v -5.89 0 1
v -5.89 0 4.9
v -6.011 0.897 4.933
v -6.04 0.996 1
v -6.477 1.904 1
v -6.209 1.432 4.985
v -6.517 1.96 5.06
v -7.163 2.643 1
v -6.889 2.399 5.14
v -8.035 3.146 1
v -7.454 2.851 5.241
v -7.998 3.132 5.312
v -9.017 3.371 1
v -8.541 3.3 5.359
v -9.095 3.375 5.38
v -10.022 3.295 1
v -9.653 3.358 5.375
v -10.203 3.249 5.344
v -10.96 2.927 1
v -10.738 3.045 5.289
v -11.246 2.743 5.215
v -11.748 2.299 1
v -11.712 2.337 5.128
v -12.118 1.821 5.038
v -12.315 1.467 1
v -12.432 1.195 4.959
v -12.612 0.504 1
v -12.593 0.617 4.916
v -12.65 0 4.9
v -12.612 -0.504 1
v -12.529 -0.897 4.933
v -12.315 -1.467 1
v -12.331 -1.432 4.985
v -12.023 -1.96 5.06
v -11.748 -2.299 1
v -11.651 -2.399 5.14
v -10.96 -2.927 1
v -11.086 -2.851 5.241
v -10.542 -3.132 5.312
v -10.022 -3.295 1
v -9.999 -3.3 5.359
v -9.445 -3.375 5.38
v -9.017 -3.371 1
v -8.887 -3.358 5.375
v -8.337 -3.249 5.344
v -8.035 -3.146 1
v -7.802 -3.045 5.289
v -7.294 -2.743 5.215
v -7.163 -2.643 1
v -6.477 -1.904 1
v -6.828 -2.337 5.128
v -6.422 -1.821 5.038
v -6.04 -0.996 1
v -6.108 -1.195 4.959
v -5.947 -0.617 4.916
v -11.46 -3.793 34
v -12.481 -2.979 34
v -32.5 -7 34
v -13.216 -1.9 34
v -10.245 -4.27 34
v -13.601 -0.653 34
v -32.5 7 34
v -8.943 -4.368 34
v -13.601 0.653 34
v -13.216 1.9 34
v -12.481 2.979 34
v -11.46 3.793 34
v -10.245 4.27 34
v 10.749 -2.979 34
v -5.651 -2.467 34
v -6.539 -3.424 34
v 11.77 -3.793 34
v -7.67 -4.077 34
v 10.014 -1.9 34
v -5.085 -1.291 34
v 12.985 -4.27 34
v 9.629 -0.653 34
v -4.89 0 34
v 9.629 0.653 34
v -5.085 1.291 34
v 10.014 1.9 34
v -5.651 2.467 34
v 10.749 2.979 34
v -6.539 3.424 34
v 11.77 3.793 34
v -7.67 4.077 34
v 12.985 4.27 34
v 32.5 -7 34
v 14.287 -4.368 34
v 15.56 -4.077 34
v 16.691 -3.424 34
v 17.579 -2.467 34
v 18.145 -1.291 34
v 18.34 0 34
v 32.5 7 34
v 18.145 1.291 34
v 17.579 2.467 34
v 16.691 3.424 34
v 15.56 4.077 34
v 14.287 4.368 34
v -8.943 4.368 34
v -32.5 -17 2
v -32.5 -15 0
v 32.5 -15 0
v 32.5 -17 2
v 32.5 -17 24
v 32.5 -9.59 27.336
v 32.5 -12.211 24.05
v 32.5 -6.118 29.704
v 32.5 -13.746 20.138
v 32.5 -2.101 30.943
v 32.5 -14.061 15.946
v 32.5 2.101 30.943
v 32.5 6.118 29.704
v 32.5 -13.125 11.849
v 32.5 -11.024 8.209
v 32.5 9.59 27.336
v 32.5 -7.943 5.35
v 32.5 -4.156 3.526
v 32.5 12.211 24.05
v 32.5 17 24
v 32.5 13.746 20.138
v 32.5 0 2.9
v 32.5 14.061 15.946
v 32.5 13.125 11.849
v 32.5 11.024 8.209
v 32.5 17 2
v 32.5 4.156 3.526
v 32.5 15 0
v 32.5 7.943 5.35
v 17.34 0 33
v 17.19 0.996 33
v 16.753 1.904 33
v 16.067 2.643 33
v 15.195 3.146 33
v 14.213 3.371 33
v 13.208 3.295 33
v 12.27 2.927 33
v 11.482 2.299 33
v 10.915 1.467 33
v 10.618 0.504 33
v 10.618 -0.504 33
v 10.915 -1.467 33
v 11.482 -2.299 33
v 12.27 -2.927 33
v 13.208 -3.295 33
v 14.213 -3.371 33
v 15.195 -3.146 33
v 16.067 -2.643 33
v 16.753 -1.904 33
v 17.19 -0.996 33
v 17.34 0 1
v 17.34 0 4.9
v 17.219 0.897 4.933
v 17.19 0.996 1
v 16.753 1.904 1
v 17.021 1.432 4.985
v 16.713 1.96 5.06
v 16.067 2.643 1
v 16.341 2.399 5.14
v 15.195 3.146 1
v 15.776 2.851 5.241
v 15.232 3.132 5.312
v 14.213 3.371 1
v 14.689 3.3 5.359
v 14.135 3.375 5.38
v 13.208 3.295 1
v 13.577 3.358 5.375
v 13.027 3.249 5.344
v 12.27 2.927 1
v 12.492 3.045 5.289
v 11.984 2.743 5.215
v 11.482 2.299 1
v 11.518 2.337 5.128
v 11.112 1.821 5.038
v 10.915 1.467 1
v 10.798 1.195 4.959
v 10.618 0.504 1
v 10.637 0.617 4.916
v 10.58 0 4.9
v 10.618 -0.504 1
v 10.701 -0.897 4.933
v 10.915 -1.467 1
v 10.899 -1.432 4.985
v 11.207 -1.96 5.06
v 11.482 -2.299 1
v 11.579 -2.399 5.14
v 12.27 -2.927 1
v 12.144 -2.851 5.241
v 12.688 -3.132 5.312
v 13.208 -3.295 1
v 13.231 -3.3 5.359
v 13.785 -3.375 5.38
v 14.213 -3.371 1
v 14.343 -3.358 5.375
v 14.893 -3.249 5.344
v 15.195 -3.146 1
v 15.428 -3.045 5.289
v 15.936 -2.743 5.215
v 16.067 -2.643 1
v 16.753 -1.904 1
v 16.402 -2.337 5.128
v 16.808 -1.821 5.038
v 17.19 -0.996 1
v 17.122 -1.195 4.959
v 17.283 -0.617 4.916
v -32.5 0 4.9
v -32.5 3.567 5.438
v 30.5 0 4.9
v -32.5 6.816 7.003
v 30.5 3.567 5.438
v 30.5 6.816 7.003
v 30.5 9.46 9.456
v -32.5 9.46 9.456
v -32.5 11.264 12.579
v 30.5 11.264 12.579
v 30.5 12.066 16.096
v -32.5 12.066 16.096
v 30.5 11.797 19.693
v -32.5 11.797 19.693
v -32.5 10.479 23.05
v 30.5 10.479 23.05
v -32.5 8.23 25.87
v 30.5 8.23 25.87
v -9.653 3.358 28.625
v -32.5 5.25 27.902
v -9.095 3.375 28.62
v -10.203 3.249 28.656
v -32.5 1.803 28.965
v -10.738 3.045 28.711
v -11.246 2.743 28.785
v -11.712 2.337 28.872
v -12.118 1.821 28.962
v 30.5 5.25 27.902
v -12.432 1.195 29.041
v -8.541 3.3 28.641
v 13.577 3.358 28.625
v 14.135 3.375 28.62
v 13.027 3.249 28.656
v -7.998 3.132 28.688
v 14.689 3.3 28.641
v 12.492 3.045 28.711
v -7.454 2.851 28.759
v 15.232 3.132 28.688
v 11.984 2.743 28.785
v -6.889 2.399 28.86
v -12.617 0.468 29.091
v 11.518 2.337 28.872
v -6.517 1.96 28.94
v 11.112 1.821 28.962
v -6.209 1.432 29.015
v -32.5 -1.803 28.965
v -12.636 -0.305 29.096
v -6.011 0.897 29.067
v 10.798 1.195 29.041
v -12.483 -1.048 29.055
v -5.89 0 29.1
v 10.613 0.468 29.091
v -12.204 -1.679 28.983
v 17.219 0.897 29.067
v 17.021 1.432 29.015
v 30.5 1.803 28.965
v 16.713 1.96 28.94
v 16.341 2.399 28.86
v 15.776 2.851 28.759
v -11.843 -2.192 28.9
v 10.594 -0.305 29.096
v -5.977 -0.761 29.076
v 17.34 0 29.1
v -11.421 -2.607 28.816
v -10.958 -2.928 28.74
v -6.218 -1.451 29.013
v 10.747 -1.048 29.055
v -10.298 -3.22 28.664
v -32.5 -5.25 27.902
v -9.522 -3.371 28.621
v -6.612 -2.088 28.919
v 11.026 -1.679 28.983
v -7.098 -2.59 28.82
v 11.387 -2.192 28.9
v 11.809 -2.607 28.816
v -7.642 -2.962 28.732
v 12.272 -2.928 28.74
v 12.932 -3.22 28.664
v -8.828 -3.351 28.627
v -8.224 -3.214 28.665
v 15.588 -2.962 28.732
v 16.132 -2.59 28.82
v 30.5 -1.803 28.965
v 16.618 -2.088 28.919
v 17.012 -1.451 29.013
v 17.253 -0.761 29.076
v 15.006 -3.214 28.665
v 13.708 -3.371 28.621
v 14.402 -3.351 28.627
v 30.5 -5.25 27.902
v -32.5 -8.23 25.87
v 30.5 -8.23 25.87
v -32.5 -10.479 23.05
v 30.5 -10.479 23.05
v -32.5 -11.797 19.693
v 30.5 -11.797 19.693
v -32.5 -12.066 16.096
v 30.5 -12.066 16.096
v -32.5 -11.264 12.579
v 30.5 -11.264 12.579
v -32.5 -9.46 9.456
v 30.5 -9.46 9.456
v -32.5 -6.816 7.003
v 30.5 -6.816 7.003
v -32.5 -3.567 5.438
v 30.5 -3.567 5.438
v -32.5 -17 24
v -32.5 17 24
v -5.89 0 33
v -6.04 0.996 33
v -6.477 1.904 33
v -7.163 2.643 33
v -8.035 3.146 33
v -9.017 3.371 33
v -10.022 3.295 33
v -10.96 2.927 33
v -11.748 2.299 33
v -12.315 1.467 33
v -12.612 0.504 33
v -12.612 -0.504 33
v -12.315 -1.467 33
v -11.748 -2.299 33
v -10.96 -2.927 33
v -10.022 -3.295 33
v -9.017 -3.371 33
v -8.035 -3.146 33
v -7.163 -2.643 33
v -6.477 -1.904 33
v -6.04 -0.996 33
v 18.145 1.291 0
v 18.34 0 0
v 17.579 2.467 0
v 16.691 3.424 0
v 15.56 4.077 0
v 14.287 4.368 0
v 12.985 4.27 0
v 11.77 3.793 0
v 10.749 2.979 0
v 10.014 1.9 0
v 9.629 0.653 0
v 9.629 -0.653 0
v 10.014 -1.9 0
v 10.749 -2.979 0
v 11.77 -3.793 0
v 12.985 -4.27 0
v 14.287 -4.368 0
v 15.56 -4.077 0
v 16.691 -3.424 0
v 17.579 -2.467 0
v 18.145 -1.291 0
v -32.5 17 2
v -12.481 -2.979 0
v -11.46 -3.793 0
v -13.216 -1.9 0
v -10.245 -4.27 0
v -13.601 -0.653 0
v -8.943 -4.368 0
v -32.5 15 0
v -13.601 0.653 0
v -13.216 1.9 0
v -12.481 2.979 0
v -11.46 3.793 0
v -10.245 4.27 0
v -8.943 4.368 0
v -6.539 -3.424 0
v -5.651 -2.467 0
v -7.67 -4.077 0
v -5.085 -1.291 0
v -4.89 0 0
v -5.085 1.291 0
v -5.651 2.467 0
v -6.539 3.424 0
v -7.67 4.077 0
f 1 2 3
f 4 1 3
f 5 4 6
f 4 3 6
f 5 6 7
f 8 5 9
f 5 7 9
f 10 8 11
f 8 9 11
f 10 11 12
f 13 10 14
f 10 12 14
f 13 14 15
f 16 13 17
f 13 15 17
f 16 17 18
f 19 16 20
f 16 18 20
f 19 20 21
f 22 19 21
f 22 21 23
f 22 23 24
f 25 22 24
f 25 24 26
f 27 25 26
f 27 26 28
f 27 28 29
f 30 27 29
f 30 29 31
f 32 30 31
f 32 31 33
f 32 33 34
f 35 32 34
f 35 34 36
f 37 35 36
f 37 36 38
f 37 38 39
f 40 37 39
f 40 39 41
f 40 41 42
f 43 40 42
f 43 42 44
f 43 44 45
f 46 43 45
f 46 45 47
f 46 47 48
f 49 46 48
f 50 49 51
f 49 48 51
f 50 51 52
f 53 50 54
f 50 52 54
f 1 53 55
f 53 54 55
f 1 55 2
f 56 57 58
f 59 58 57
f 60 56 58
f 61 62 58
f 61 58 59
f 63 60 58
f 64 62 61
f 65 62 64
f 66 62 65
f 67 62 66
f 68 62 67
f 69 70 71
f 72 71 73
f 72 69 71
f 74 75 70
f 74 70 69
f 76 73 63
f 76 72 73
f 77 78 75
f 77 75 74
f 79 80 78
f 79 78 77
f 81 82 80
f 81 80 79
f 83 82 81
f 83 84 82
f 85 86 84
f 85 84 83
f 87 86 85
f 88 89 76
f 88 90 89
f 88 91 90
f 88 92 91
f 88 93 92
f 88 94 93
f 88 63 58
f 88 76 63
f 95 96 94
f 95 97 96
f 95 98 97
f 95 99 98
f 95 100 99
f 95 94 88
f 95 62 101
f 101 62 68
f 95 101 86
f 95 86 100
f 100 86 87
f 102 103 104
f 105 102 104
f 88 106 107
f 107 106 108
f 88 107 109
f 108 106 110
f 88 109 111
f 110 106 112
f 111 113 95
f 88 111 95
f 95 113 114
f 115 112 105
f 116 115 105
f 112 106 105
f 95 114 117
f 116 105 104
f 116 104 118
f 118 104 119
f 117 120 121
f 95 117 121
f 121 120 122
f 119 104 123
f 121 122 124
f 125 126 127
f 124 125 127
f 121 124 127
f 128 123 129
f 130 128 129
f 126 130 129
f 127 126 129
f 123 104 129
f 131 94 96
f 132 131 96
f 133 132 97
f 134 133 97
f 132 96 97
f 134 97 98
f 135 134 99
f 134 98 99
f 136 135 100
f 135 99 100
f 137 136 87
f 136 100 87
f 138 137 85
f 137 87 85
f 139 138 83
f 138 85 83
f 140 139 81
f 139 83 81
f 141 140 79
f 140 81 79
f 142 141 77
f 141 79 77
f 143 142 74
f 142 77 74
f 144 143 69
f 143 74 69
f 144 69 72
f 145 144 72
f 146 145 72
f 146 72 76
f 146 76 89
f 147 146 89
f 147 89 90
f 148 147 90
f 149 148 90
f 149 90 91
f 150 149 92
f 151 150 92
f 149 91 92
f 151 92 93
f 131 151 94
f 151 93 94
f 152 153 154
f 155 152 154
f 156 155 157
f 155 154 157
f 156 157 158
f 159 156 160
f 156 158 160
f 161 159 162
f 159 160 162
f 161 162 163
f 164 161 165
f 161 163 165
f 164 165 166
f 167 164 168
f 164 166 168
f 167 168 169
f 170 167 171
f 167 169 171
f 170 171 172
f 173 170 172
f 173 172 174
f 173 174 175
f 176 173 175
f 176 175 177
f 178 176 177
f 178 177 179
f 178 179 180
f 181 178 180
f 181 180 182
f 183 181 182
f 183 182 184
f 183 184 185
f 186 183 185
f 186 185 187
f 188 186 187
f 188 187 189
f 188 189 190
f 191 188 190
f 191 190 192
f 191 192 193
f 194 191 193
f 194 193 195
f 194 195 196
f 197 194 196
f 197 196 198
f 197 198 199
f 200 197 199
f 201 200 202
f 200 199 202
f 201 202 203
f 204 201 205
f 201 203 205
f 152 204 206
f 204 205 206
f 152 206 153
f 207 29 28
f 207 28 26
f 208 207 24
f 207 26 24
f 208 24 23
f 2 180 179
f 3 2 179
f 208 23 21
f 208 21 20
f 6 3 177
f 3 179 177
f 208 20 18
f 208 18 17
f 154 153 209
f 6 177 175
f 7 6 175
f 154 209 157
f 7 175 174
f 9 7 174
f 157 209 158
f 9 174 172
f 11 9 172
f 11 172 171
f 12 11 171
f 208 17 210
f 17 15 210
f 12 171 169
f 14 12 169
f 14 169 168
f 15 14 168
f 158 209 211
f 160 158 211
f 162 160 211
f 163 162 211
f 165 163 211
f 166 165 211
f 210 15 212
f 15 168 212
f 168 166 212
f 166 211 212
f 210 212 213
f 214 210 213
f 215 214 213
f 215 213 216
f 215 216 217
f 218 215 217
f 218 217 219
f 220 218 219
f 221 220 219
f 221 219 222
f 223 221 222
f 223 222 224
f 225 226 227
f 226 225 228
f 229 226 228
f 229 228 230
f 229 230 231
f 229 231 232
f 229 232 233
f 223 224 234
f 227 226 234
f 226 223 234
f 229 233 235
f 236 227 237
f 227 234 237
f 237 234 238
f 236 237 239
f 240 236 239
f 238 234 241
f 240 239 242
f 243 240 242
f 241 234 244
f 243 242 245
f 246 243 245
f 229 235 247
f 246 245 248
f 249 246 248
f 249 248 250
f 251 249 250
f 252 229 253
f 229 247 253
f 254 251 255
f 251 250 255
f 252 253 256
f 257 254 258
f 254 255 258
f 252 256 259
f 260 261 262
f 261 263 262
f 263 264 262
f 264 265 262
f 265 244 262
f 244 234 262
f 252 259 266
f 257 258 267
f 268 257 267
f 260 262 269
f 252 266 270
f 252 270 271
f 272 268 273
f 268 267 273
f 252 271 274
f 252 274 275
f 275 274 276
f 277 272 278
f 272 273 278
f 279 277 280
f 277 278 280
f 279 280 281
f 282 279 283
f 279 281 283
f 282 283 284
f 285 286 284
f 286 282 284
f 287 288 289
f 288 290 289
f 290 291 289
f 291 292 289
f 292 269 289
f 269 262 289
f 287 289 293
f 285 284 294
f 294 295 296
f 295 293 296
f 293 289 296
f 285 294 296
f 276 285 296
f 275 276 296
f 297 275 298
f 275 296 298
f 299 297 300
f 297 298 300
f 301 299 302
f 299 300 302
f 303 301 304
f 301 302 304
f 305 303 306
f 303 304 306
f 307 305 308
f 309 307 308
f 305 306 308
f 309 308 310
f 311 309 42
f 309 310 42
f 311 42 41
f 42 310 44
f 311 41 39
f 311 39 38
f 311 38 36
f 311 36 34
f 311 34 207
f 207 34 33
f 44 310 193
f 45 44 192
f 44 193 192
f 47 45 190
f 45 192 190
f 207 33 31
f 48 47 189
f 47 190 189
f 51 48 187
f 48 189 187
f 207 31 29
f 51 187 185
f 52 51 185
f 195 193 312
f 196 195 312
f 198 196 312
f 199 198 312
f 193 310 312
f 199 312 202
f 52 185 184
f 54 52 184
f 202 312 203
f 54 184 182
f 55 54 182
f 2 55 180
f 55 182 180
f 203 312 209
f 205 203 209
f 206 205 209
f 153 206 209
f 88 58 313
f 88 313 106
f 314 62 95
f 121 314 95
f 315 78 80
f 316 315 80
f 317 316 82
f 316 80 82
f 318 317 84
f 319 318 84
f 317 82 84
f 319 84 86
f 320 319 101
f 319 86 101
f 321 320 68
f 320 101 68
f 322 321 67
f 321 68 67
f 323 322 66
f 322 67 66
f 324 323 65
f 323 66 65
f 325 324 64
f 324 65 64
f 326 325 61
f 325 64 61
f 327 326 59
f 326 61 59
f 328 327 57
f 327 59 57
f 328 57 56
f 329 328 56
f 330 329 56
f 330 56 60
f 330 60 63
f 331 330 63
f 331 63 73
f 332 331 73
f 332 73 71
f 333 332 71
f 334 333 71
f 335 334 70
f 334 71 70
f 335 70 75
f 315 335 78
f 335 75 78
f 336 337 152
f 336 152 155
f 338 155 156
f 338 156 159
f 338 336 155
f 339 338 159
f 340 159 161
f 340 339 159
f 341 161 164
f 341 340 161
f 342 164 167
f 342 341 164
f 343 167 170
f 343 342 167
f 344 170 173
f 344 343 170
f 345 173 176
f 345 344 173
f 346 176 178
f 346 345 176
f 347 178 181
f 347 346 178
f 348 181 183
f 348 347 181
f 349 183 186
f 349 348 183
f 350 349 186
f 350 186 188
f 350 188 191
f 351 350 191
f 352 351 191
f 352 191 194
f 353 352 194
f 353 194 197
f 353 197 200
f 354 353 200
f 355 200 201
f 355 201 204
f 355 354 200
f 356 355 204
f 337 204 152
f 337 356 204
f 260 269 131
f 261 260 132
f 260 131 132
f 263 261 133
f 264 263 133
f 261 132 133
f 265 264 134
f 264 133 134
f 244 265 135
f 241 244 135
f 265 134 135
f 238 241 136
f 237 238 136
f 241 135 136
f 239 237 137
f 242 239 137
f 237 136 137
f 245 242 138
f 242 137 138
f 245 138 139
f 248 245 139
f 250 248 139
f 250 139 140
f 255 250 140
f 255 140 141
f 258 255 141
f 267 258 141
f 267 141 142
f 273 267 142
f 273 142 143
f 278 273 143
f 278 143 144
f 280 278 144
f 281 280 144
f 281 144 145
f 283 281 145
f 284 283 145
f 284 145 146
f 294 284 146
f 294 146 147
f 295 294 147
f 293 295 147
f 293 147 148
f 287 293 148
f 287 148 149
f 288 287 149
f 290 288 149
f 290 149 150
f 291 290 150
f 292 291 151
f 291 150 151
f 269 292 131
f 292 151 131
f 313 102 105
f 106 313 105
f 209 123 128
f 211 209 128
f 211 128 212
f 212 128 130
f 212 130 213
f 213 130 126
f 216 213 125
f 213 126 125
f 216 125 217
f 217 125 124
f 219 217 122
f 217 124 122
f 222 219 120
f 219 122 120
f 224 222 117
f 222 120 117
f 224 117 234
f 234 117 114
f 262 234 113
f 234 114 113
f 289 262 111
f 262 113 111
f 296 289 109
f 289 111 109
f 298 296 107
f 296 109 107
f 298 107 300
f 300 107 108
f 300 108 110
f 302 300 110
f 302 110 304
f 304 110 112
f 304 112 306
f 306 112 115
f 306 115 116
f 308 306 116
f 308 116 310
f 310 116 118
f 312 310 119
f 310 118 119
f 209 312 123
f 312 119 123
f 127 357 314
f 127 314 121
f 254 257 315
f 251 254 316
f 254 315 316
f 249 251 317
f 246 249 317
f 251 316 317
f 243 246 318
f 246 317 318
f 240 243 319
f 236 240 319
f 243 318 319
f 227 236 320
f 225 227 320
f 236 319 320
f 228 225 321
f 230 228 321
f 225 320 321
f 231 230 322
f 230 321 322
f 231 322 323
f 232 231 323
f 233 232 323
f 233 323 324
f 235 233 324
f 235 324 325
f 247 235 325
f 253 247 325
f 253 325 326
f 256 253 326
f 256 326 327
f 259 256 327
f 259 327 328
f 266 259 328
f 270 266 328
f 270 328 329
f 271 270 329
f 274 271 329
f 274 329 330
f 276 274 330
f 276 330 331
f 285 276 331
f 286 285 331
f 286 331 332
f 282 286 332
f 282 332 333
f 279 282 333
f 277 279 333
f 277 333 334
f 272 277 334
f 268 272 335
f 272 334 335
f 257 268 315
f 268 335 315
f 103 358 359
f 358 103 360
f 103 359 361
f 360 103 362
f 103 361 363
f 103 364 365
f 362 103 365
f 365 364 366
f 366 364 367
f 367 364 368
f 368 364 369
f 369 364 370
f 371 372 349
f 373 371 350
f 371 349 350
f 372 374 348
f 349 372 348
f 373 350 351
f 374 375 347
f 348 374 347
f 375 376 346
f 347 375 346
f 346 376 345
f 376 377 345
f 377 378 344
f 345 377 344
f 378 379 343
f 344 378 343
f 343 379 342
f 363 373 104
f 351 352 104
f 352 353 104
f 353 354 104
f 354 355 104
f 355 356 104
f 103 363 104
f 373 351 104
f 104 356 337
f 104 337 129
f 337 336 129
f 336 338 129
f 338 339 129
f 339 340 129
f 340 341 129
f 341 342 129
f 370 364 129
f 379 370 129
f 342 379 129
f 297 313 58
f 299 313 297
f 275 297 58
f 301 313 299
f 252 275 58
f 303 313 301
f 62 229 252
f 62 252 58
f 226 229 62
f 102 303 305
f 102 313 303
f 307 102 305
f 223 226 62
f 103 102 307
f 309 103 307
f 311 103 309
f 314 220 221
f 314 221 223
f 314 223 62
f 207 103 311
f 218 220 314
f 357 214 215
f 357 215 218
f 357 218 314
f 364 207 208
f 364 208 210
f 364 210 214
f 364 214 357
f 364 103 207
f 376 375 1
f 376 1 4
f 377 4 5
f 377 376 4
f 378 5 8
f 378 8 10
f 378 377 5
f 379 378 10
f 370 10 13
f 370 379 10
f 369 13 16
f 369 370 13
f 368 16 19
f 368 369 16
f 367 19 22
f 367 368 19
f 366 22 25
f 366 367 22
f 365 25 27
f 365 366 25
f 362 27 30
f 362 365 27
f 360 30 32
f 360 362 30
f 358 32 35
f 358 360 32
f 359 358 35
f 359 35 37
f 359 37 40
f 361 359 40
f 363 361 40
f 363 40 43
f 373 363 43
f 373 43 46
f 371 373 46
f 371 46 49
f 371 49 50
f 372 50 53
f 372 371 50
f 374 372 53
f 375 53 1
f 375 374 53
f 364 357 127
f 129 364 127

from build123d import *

# Parameters (mm, degrees)
SKETCH2_W           = 65
SKETCH2_H           = 34
BOSS_EXTRUDE1_DEPTH = 34
CHAMFER1_SIZE       = 10
CHAMFER2_SIZE       = 2
SKETCH3_R           = 12.1
CUT_EXTRUDE1_DEPTH  = 76.299402388
CHAMFER3_SIZE       = 2
SKETCH4_R           = 3.38
CUT_EXTRUDE2_DEPTH  = 51.012498438
CHAMFER4_SIZE       = 1


with BuildPart() as part:
    # Sketch2 → Boss-Extrude1 (new body)
    with BuildSketch(Plane.XY):
        Rectangle(SKETCH2_W, SKETCH2_H)
    extrude(amount=BOSS_EXTRUDE1_DEPTH)

    # Chamfer1
    chamfer1_edges = [part.edges().sort_by_distance(p)[0] for p in [
        (0, -17, 34),
        (0, 17, 34),
    ]]
    chamfer(chamfer1_edges, length=CHAMFER1_SIZE)

    # Chamfer2
    chamfer2_edges = [part.edges().sort_by_distance(p)[0] for p in [
        (0, -17, 0),
        (0, 17, 0),
    ]]
    chamfer(chamfer2_edges, length=CHAMFER2_SIZE)

    # Sketch3 → Cut-Extrude1 (cut, through all)
    with BuildSketch(Plane(origin=(32.5, 0, 0), x_dir=(0, 0, -1), z_dir=(1, 0, 0))):
        with Locations((-17, 0)):
            Circle(SKETCH3_R)
    extrude(amount=-CUT_EXTRUDE1_DEPTH, mode=Mode.SUBTRACT)

    # Chamfer3
    chamfer3_edges = [part.edges().sort_by_distance(p)[0] for p in [
        (32.5, 0, 29.1),
    ]]
    chamfer(chamfer3_edges, length=CHAMFER3_SIZE)

    # Sketch4 → Cut-Extrude2 (cut, through all)
    with BuildSketch(Plane.XY.offset(34)):
        with Locations((-9.27, 0)):
            Circle(SKETCH4_R)
        with Locations((13.96, 0)):
            Circle(SKETCH4_R)
    extrude(amount=-CUT_EXTRUDE2_DEPTH, mode=Mode.SUBTRACT)

    # Chamfer4
    chamfer4_edges = [part.edges().sort_by_distance(p)[0] for p in [
        (-12.65, 0, 0),
        (-12.65, 0, 34),
        (10.58, 0, 0),
        (10.58, 0, 34),
    ]]
    chamfer(chamfer4_edges, length=CHAMFER4_SIZE)


solid = part.part
